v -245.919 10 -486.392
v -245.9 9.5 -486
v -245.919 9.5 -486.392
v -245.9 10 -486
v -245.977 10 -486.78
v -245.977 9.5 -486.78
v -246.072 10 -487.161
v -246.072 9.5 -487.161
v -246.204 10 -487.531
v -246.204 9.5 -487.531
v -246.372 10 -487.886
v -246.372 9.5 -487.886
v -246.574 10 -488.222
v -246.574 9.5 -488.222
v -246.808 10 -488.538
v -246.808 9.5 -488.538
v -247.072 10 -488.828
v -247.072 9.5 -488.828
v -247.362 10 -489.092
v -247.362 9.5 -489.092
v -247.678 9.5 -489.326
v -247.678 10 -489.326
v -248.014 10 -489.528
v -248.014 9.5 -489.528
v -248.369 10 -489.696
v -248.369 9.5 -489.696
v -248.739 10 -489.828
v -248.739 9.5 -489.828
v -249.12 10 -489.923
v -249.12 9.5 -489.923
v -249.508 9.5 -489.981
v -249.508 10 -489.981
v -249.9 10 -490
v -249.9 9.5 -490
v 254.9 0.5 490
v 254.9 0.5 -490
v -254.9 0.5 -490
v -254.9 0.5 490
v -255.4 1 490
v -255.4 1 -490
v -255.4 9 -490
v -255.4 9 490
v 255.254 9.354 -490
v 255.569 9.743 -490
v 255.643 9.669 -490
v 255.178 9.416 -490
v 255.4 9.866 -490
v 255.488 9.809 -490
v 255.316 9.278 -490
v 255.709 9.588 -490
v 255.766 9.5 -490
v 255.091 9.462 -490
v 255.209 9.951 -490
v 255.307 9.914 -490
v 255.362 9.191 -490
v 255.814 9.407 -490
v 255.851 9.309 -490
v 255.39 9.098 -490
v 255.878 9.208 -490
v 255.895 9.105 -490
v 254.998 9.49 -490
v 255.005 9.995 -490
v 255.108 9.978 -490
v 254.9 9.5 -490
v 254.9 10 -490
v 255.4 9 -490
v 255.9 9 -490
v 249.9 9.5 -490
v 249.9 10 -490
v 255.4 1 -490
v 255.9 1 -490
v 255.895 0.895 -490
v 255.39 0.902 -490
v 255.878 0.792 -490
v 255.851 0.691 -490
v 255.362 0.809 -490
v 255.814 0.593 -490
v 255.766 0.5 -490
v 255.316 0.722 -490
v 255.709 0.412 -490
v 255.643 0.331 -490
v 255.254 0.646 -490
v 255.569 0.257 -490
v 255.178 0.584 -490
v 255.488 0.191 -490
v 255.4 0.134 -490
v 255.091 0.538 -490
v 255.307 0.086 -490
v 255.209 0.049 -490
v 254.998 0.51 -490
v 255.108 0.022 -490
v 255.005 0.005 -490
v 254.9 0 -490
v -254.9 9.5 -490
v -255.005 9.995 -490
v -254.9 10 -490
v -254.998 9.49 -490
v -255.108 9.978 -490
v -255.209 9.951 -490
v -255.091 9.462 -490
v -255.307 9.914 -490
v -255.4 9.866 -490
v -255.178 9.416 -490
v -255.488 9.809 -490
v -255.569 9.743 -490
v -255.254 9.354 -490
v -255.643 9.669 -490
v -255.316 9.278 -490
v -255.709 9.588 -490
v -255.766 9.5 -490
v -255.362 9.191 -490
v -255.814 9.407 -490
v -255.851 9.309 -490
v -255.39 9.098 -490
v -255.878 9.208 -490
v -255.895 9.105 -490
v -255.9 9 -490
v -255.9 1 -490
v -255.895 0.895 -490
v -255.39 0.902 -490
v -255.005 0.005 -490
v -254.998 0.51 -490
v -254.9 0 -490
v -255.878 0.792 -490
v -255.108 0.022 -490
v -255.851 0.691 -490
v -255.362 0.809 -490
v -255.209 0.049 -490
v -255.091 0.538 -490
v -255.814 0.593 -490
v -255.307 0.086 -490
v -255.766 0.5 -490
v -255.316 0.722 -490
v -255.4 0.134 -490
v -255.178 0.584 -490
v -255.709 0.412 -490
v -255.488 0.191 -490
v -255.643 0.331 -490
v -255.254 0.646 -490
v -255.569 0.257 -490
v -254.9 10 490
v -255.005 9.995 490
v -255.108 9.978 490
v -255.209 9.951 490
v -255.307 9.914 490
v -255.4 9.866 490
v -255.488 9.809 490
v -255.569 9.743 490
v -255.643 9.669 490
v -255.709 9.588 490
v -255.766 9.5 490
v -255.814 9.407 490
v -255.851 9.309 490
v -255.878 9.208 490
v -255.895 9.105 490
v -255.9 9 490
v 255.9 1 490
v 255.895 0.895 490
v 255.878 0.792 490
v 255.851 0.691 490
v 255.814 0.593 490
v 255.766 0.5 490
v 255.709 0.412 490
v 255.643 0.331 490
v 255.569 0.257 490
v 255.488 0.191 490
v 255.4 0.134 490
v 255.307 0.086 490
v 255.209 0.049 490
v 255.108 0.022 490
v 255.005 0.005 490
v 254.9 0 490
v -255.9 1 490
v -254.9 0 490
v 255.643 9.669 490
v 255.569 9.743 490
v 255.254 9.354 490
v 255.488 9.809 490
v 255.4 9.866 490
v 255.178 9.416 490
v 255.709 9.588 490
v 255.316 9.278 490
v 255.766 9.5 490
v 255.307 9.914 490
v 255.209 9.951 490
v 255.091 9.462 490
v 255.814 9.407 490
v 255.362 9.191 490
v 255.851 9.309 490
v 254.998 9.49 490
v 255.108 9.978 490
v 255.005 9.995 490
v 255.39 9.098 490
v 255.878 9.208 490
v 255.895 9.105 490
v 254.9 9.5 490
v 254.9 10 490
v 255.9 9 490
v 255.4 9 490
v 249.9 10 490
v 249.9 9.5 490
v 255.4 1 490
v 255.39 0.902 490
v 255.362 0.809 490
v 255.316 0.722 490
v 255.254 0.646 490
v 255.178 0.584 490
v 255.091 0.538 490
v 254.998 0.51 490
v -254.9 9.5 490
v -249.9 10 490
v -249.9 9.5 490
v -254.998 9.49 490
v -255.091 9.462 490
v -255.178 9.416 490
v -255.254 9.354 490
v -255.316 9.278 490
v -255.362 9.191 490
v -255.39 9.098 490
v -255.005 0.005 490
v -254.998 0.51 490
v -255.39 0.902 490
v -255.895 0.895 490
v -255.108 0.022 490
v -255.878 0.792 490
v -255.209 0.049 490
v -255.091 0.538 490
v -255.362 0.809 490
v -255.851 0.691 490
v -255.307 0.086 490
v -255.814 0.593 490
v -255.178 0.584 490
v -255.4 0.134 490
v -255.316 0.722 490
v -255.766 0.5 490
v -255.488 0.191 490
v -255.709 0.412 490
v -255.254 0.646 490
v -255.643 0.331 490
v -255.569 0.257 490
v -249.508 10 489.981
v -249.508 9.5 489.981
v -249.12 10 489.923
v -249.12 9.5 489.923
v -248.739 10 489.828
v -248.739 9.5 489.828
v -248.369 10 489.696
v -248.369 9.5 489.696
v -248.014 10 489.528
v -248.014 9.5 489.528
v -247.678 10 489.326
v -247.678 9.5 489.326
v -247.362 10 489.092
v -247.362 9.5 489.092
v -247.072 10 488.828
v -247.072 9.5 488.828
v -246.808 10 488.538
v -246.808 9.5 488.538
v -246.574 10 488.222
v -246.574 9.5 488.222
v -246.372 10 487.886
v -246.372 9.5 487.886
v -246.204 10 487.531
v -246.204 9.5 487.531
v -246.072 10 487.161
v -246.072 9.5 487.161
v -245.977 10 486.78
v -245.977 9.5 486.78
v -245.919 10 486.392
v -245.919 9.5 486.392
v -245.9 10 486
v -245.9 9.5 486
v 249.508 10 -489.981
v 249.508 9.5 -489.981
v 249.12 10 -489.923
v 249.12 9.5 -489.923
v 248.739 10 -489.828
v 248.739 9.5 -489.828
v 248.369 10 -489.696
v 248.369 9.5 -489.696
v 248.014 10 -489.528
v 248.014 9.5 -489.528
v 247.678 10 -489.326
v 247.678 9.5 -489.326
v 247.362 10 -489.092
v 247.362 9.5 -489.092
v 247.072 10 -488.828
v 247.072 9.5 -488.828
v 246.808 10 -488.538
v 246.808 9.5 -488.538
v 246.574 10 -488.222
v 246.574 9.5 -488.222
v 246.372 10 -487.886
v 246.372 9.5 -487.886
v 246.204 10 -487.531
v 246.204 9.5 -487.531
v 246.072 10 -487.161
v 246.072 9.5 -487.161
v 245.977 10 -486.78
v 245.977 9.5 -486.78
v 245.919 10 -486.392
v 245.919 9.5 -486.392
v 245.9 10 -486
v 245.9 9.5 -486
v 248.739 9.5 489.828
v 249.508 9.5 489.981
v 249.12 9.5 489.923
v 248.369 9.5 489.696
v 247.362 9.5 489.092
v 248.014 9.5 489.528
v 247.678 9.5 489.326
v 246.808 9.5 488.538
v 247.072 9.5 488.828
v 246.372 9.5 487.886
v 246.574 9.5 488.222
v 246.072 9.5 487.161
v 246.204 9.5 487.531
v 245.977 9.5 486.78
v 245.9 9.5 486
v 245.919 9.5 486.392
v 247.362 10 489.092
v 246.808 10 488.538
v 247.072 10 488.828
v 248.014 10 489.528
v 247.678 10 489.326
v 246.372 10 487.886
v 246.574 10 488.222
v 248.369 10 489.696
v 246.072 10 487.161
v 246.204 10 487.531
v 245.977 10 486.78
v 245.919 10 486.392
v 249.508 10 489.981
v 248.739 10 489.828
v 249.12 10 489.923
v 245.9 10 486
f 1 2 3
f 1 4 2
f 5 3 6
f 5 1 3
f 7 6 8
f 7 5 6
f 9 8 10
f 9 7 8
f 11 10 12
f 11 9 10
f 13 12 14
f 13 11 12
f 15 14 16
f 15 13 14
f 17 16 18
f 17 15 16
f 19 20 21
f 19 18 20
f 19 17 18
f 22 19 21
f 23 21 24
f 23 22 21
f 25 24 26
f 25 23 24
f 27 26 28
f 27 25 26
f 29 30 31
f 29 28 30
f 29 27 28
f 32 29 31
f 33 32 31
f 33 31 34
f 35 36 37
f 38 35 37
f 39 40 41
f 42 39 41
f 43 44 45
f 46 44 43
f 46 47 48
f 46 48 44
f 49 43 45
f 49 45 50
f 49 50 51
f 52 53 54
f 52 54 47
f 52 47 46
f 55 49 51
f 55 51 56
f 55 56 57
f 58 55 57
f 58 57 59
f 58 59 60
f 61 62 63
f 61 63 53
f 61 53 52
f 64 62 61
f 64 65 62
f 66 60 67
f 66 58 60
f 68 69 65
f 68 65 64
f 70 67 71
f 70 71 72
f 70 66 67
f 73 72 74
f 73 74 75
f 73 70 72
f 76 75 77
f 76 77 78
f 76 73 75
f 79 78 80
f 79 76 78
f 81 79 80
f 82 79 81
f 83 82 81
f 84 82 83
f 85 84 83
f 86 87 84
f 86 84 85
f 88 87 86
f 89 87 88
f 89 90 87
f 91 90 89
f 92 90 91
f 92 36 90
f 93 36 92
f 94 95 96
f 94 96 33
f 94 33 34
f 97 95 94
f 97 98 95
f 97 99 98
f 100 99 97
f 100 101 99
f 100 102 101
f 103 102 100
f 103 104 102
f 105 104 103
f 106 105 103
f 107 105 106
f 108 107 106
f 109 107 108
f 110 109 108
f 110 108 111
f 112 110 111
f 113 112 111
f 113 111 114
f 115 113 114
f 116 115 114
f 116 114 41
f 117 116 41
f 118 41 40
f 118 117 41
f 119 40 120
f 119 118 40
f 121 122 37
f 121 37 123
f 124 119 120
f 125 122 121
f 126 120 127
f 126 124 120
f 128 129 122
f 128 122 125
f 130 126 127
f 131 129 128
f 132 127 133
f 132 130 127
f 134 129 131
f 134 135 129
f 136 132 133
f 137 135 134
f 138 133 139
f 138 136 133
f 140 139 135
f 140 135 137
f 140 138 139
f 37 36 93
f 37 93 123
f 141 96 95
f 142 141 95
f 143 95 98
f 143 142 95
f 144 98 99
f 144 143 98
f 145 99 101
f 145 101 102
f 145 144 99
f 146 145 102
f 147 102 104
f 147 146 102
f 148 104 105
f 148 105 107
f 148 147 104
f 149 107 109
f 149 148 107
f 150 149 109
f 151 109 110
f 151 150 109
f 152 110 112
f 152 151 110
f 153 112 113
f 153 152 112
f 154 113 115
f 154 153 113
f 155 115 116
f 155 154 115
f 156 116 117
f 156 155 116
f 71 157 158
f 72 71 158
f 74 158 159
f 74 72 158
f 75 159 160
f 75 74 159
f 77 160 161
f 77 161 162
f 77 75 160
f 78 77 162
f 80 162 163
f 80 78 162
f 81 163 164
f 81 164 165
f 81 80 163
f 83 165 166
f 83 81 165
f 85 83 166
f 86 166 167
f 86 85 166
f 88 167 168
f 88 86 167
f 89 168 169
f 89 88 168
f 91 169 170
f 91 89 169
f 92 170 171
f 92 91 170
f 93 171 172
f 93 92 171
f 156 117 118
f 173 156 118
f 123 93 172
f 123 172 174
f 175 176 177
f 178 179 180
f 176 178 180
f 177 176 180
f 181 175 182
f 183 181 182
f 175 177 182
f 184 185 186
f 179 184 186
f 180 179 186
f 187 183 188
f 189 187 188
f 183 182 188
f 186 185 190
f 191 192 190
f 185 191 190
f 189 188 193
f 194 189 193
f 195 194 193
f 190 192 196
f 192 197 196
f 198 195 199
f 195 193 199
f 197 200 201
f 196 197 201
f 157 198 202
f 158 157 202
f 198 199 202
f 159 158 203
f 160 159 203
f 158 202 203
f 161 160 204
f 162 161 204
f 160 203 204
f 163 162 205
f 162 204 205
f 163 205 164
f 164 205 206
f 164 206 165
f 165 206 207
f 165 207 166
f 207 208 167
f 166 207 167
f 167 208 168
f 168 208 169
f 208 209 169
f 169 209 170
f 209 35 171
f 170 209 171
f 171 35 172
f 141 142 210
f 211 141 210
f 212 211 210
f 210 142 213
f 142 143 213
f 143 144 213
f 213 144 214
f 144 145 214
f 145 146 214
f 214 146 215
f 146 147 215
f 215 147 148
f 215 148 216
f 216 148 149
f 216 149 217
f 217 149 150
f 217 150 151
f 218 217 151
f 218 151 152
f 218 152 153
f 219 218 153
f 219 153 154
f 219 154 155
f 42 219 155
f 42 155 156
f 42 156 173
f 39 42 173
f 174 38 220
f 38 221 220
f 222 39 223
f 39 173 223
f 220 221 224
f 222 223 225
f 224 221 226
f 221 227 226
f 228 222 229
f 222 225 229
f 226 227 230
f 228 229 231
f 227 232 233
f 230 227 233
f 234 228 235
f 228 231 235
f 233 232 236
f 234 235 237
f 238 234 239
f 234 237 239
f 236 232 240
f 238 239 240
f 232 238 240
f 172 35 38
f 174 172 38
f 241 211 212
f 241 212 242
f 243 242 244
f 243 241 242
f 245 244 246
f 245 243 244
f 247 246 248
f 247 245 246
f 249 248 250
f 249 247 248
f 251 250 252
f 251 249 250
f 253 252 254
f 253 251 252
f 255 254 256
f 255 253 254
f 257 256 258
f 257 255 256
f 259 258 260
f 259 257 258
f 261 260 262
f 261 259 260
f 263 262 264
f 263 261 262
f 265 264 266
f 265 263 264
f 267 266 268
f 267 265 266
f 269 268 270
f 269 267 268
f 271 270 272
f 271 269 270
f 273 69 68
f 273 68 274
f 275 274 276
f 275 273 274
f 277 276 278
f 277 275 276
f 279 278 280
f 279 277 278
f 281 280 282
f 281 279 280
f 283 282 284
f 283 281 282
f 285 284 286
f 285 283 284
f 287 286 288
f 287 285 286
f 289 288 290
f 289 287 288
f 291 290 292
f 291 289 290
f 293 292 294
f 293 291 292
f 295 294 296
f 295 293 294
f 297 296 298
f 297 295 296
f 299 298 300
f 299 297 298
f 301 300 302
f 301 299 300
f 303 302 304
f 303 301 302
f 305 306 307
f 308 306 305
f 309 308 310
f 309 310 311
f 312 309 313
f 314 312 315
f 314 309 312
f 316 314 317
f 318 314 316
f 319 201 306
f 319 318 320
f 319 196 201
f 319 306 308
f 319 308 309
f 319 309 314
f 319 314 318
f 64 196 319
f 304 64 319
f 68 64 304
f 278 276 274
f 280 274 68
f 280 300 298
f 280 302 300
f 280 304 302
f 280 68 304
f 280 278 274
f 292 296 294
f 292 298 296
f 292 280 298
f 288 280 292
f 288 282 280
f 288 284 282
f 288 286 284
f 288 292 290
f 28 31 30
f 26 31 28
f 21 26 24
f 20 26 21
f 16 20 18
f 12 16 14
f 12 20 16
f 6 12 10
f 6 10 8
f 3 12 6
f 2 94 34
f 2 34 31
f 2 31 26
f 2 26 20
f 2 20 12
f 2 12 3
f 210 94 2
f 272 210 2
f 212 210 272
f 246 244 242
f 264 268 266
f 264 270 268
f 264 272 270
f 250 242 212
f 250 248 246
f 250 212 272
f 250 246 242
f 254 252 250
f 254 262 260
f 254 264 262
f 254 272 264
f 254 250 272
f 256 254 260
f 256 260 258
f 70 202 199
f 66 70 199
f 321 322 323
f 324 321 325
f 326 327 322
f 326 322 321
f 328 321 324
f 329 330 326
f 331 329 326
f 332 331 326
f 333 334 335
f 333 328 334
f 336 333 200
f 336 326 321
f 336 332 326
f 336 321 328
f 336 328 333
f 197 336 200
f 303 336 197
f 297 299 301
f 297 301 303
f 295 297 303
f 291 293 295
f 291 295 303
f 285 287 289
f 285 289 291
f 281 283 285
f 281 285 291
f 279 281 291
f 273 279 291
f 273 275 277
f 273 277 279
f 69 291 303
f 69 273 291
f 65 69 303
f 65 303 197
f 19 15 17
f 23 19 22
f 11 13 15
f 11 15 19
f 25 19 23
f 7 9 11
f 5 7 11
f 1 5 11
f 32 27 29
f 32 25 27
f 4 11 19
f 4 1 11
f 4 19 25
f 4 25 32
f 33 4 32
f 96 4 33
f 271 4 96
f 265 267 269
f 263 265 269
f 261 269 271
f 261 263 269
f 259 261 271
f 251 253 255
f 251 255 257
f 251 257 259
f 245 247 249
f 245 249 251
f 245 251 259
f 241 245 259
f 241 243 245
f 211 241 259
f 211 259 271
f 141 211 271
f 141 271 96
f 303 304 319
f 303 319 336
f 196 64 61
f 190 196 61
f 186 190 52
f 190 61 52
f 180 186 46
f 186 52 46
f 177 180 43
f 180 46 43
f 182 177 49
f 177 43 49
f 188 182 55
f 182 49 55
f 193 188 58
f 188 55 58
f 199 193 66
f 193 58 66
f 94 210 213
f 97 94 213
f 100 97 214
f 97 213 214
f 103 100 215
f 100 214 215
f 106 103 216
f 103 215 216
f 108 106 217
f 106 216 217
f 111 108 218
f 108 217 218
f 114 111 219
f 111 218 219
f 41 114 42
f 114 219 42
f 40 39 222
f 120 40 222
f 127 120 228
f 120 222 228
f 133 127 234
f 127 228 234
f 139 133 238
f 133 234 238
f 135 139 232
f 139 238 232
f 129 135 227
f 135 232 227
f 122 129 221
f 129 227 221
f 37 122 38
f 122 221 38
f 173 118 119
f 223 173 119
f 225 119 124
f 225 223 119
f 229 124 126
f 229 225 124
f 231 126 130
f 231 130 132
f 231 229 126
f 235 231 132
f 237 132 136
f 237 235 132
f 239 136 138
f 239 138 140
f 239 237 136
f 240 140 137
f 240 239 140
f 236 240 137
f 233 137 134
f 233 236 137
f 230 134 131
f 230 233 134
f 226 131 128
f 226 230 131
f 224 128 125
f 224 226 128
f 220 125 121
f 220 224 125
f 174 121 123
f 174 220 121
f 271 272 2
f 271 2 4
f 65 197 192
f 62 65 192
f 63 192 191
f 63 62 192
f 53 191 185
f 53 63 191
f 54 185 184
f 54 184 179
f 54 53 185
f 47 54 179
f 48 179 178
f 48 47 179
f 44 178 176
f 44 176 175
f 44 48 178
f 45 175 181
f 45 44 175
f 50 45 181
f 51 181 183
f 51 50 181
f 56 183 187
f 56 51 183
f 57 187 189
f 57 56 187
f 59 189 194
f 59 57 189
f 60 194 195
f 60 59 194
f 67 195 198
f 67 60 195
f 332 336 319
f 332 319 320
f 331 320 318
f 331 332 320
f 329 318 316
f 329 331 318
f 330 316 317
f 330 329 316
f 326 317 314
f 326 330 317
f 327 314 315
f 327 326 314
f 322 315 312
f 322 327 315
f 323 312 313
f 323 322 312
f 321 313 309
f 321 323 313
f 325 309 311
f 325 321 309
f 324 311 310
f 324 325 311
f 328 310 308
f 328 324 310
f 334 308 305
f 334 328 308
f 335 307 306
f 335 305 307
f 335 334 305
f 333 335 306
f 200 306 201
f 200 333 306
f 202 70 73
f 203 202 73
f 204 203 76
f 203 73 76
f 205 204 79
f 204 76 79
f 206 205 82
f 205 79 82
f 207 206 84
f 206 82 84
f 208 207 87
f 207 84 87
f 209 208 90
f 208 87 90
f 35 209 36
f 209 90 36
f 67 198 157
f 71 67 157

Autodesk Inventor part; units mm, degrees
ref_plane "YZ Plane" through (0, 0, 0) normal (1, 0, 0) x (0, 1, 0)
ref_plane "XZ Plane" through (0, 0, 0) normal (0, 1, 0) x (-1, 0, 0)
ref_plane "XY Plane" through (0, 0, 0) normal (0, 0, 1) x (1, 0, 0)
sketch "Sketch6" plane through (0, 0, 0) normal (0, 1, 0) x (-1, 0, 0)
  line L0 (255.9, -490) -> (-255.9, -490)
  line L1 (-255.9, -490) -> (-255.9, 490)
  line L2 (-255.9, 490) -> (255.9, 490)
  line L3 (255.9, 490) -> (255.9, -490)
  line L4 (255.9, -490) -> (-255.9, 490) construction
  line L5 (-255.9, -490) -> (255.9, 490) construction
  point P0 (0, 0)
  dimension "d52" = 511.8
  dimension "d53" = 980
extrude "Plate2" add sketch "Sketch6" along normal blind 0.5
sketch "Sketch11" plane through (-255.4, 0, 490) normal (-1, 0, 0) x (0, -1, 0)
  line L0 (0, -980) -> (0, 0)
  line L1 (0, 0) -> (-10, 0)
  line L2 (-10, 0) -> (-10, -980)
  line L3 (-10, -980) -> (0, -980)
edge flange "Flange2" height 10 angle 90 thickness 0.5 bend radius 0.5 thickness toward (-1, 0, 0) relief tear relief width 0.5 relief depth 0.25 edges at (-255.9, 0.5, 0) wall of the first edge with corners at (-255.4, 0, -490) (-255.4, 0, 490) (-255.4, 10, 490) (-255.4, 10, -490)
bend "Bend3"
corner "Corner3"
sketch "Sketch12" plane through (-255.9, 9.5, 490) normal (0, 1, 0) x (-1, 0, 0)
  line L0 (0, -980) -> (0, 0)
  line L1 (0, 0) -> (-10, 0)
  line L2 (-10, 0) -> (-10, -980)
  line L3 (-10, -980) -> (0, -980)
edge flange "Flange3" height 10 angle 90 thickness 0.5 bend radius 0.5 thickness toward (0, 1, 0) relief tear relief width 0.5 relief depth 0.25 edges at (-255.4, 10, 0) wall of the first edge with corners at (-255.9, 9.5, -490) (-255.9, 9.5, 490) (-245.9, 9.5, 490) (-245.9, 9.5, -490)
bend "Bend4"
corner "Corner4"
sketch "Sketch13" plane through (255.4, 0, -490) normal (1, 0, 0) x (0, 1, 0)
  line L0 (0, 980) -> (0, 0)
  line L1 (0, 0) -> (10, 0)
  line L2 (10, 0) -> (10, 980)
  line L3 (10, 980) -> (0, 980)
edge flange "Flange4" height 10 angle 90 thickness 0.5 bend radius 0.5 thickness toward (1, 0, 0) relief tear relief width 0.5 relief depth 0.25 edges at (255.9, 0.5, 0) wall of the first edge with corners at (255.4, 0, 490) (255.4, 0, -490) (255.4, 10, -490) (255.4, 10, 490)
bend "Bend5"
corner "Corner5"
sketch "Sketch14" plane through (255.9, 9.5, -490) normal (0, 1, 0) x (-1, 0, 0)
  line L0 (0, 980) -> (0, 0)
  line L1 (0, 0) -> (10, 0)
  line L2 (10, 0) -> (10, 980)
  line L3 (10, 980) -> (0, 980)
edge flange "Flange5" height 10 angle 90 thickness 0.5 bend radius 0.5 thickness toward (0, 1, 0) relief tear relief width 0.5 relief depth 0.25 edges at (255.4, 10, 0) wall of the first edge with corners at (255.9, 9.5, 490) (255.9, 9.5, -490) (245.9, 9.5, -490) (245.9, 9.5, 490)
bend "Bend6"
corner "Corner6"
fillet "Corner Round1" radius 4 4 edges at (245.9, 9.75, -490) (-245.9, 9.75, -490) (-245.9, 9.75, 490) (245.9, 9.75, 490)
equation "\"d52\" = ЖАБРЫ_базовая_ширина - 4 * ЖАБРЫ_шаг_листов"
equation "\"d53\" = ЖАБРЫ_базовая_длина_кор_лист"
equation "\"d54\" = Thickness"
equation "\"d84\" = BendReliefWidth"
equation "\"d85\" = BendReliefDepth"
equation "\"d86\" = MinimumRemnant"
equation "\"d87\" = TransitionRadius"
equation "\"d90\" = BendRadius"
equation "\"d91\" = CornerReliefSize"
equation "\"d92\" = GapSize"
equation "\"d93\" = JacobiRadiusSize"
equation "\"d94\" = BendReliefWidth"
equation "\"d95\" = BendReliefDepth"
equation "\"d96\" = MinimumRemnant"
equation "\"d97\" = TransitionRadius"
equation "\"d100\" = BendRadius"
equation "\"d101\" = CornerReliefSize"
equation "\"d102\" = GapSize"
equation "\"d103\" = JacobiRadiusSize"
equation "\"d104\" = BendReliefWidth"
equation "\"d105\" = BendReliefDepth"
equation "\"d106\" = MinimumRemnant"
equation "\"d107\" = TransitionRadius"
equation "\"d110\" = BendRadius"
equation "\"d111\" = CornerReliefSize"
equation "\"d112\" = GapSize"
equation "\"d113\" = JacobiRadiusSize"
equation "\"d114\" = BendReliefWidth"
equation "\"d115\" = BendReliefDepth"
equation "\"d116\" = MinimumRemnant"
equation "\"d117\" = TransitionRadius"
equation "\"d120\" = BendRadius"
equation "\"d121\" = CornerReliefSize"
equation "\"d122\" = GapSize"
equation "\"d123\" = JacobiRadiusSize"
equation "\"BendRadius\" = Thickness"
equation "\"BendReliefWidth\" = Thickness"
equation "\"BendReliefDepth\" = 0.5 * Thickness"
equation "\"CornerReliefSize\" = 4 * Thickness"
equation "\"MinimumRemnant\" = 2 * Thickness"
equation "\"TransitionRadius\" = BendRadius"
equation "\"JacobiRadiusSize\" = BendRadius"
equation "\"GapSize\" = Thickness"
equation "\"ЖАБРЫ_базовая_ширина\" = 915"
equation "\"ЖАБРЫ_шаг_листов\" = 100.8"
equation "\"ЖАБРЫ_базовая_длина_кор_лист\" = 980"
equation "\"Thickness\" = 0.5"
properties part number "MSC 808 SHEET GILLS" material "Stainless Steel"
